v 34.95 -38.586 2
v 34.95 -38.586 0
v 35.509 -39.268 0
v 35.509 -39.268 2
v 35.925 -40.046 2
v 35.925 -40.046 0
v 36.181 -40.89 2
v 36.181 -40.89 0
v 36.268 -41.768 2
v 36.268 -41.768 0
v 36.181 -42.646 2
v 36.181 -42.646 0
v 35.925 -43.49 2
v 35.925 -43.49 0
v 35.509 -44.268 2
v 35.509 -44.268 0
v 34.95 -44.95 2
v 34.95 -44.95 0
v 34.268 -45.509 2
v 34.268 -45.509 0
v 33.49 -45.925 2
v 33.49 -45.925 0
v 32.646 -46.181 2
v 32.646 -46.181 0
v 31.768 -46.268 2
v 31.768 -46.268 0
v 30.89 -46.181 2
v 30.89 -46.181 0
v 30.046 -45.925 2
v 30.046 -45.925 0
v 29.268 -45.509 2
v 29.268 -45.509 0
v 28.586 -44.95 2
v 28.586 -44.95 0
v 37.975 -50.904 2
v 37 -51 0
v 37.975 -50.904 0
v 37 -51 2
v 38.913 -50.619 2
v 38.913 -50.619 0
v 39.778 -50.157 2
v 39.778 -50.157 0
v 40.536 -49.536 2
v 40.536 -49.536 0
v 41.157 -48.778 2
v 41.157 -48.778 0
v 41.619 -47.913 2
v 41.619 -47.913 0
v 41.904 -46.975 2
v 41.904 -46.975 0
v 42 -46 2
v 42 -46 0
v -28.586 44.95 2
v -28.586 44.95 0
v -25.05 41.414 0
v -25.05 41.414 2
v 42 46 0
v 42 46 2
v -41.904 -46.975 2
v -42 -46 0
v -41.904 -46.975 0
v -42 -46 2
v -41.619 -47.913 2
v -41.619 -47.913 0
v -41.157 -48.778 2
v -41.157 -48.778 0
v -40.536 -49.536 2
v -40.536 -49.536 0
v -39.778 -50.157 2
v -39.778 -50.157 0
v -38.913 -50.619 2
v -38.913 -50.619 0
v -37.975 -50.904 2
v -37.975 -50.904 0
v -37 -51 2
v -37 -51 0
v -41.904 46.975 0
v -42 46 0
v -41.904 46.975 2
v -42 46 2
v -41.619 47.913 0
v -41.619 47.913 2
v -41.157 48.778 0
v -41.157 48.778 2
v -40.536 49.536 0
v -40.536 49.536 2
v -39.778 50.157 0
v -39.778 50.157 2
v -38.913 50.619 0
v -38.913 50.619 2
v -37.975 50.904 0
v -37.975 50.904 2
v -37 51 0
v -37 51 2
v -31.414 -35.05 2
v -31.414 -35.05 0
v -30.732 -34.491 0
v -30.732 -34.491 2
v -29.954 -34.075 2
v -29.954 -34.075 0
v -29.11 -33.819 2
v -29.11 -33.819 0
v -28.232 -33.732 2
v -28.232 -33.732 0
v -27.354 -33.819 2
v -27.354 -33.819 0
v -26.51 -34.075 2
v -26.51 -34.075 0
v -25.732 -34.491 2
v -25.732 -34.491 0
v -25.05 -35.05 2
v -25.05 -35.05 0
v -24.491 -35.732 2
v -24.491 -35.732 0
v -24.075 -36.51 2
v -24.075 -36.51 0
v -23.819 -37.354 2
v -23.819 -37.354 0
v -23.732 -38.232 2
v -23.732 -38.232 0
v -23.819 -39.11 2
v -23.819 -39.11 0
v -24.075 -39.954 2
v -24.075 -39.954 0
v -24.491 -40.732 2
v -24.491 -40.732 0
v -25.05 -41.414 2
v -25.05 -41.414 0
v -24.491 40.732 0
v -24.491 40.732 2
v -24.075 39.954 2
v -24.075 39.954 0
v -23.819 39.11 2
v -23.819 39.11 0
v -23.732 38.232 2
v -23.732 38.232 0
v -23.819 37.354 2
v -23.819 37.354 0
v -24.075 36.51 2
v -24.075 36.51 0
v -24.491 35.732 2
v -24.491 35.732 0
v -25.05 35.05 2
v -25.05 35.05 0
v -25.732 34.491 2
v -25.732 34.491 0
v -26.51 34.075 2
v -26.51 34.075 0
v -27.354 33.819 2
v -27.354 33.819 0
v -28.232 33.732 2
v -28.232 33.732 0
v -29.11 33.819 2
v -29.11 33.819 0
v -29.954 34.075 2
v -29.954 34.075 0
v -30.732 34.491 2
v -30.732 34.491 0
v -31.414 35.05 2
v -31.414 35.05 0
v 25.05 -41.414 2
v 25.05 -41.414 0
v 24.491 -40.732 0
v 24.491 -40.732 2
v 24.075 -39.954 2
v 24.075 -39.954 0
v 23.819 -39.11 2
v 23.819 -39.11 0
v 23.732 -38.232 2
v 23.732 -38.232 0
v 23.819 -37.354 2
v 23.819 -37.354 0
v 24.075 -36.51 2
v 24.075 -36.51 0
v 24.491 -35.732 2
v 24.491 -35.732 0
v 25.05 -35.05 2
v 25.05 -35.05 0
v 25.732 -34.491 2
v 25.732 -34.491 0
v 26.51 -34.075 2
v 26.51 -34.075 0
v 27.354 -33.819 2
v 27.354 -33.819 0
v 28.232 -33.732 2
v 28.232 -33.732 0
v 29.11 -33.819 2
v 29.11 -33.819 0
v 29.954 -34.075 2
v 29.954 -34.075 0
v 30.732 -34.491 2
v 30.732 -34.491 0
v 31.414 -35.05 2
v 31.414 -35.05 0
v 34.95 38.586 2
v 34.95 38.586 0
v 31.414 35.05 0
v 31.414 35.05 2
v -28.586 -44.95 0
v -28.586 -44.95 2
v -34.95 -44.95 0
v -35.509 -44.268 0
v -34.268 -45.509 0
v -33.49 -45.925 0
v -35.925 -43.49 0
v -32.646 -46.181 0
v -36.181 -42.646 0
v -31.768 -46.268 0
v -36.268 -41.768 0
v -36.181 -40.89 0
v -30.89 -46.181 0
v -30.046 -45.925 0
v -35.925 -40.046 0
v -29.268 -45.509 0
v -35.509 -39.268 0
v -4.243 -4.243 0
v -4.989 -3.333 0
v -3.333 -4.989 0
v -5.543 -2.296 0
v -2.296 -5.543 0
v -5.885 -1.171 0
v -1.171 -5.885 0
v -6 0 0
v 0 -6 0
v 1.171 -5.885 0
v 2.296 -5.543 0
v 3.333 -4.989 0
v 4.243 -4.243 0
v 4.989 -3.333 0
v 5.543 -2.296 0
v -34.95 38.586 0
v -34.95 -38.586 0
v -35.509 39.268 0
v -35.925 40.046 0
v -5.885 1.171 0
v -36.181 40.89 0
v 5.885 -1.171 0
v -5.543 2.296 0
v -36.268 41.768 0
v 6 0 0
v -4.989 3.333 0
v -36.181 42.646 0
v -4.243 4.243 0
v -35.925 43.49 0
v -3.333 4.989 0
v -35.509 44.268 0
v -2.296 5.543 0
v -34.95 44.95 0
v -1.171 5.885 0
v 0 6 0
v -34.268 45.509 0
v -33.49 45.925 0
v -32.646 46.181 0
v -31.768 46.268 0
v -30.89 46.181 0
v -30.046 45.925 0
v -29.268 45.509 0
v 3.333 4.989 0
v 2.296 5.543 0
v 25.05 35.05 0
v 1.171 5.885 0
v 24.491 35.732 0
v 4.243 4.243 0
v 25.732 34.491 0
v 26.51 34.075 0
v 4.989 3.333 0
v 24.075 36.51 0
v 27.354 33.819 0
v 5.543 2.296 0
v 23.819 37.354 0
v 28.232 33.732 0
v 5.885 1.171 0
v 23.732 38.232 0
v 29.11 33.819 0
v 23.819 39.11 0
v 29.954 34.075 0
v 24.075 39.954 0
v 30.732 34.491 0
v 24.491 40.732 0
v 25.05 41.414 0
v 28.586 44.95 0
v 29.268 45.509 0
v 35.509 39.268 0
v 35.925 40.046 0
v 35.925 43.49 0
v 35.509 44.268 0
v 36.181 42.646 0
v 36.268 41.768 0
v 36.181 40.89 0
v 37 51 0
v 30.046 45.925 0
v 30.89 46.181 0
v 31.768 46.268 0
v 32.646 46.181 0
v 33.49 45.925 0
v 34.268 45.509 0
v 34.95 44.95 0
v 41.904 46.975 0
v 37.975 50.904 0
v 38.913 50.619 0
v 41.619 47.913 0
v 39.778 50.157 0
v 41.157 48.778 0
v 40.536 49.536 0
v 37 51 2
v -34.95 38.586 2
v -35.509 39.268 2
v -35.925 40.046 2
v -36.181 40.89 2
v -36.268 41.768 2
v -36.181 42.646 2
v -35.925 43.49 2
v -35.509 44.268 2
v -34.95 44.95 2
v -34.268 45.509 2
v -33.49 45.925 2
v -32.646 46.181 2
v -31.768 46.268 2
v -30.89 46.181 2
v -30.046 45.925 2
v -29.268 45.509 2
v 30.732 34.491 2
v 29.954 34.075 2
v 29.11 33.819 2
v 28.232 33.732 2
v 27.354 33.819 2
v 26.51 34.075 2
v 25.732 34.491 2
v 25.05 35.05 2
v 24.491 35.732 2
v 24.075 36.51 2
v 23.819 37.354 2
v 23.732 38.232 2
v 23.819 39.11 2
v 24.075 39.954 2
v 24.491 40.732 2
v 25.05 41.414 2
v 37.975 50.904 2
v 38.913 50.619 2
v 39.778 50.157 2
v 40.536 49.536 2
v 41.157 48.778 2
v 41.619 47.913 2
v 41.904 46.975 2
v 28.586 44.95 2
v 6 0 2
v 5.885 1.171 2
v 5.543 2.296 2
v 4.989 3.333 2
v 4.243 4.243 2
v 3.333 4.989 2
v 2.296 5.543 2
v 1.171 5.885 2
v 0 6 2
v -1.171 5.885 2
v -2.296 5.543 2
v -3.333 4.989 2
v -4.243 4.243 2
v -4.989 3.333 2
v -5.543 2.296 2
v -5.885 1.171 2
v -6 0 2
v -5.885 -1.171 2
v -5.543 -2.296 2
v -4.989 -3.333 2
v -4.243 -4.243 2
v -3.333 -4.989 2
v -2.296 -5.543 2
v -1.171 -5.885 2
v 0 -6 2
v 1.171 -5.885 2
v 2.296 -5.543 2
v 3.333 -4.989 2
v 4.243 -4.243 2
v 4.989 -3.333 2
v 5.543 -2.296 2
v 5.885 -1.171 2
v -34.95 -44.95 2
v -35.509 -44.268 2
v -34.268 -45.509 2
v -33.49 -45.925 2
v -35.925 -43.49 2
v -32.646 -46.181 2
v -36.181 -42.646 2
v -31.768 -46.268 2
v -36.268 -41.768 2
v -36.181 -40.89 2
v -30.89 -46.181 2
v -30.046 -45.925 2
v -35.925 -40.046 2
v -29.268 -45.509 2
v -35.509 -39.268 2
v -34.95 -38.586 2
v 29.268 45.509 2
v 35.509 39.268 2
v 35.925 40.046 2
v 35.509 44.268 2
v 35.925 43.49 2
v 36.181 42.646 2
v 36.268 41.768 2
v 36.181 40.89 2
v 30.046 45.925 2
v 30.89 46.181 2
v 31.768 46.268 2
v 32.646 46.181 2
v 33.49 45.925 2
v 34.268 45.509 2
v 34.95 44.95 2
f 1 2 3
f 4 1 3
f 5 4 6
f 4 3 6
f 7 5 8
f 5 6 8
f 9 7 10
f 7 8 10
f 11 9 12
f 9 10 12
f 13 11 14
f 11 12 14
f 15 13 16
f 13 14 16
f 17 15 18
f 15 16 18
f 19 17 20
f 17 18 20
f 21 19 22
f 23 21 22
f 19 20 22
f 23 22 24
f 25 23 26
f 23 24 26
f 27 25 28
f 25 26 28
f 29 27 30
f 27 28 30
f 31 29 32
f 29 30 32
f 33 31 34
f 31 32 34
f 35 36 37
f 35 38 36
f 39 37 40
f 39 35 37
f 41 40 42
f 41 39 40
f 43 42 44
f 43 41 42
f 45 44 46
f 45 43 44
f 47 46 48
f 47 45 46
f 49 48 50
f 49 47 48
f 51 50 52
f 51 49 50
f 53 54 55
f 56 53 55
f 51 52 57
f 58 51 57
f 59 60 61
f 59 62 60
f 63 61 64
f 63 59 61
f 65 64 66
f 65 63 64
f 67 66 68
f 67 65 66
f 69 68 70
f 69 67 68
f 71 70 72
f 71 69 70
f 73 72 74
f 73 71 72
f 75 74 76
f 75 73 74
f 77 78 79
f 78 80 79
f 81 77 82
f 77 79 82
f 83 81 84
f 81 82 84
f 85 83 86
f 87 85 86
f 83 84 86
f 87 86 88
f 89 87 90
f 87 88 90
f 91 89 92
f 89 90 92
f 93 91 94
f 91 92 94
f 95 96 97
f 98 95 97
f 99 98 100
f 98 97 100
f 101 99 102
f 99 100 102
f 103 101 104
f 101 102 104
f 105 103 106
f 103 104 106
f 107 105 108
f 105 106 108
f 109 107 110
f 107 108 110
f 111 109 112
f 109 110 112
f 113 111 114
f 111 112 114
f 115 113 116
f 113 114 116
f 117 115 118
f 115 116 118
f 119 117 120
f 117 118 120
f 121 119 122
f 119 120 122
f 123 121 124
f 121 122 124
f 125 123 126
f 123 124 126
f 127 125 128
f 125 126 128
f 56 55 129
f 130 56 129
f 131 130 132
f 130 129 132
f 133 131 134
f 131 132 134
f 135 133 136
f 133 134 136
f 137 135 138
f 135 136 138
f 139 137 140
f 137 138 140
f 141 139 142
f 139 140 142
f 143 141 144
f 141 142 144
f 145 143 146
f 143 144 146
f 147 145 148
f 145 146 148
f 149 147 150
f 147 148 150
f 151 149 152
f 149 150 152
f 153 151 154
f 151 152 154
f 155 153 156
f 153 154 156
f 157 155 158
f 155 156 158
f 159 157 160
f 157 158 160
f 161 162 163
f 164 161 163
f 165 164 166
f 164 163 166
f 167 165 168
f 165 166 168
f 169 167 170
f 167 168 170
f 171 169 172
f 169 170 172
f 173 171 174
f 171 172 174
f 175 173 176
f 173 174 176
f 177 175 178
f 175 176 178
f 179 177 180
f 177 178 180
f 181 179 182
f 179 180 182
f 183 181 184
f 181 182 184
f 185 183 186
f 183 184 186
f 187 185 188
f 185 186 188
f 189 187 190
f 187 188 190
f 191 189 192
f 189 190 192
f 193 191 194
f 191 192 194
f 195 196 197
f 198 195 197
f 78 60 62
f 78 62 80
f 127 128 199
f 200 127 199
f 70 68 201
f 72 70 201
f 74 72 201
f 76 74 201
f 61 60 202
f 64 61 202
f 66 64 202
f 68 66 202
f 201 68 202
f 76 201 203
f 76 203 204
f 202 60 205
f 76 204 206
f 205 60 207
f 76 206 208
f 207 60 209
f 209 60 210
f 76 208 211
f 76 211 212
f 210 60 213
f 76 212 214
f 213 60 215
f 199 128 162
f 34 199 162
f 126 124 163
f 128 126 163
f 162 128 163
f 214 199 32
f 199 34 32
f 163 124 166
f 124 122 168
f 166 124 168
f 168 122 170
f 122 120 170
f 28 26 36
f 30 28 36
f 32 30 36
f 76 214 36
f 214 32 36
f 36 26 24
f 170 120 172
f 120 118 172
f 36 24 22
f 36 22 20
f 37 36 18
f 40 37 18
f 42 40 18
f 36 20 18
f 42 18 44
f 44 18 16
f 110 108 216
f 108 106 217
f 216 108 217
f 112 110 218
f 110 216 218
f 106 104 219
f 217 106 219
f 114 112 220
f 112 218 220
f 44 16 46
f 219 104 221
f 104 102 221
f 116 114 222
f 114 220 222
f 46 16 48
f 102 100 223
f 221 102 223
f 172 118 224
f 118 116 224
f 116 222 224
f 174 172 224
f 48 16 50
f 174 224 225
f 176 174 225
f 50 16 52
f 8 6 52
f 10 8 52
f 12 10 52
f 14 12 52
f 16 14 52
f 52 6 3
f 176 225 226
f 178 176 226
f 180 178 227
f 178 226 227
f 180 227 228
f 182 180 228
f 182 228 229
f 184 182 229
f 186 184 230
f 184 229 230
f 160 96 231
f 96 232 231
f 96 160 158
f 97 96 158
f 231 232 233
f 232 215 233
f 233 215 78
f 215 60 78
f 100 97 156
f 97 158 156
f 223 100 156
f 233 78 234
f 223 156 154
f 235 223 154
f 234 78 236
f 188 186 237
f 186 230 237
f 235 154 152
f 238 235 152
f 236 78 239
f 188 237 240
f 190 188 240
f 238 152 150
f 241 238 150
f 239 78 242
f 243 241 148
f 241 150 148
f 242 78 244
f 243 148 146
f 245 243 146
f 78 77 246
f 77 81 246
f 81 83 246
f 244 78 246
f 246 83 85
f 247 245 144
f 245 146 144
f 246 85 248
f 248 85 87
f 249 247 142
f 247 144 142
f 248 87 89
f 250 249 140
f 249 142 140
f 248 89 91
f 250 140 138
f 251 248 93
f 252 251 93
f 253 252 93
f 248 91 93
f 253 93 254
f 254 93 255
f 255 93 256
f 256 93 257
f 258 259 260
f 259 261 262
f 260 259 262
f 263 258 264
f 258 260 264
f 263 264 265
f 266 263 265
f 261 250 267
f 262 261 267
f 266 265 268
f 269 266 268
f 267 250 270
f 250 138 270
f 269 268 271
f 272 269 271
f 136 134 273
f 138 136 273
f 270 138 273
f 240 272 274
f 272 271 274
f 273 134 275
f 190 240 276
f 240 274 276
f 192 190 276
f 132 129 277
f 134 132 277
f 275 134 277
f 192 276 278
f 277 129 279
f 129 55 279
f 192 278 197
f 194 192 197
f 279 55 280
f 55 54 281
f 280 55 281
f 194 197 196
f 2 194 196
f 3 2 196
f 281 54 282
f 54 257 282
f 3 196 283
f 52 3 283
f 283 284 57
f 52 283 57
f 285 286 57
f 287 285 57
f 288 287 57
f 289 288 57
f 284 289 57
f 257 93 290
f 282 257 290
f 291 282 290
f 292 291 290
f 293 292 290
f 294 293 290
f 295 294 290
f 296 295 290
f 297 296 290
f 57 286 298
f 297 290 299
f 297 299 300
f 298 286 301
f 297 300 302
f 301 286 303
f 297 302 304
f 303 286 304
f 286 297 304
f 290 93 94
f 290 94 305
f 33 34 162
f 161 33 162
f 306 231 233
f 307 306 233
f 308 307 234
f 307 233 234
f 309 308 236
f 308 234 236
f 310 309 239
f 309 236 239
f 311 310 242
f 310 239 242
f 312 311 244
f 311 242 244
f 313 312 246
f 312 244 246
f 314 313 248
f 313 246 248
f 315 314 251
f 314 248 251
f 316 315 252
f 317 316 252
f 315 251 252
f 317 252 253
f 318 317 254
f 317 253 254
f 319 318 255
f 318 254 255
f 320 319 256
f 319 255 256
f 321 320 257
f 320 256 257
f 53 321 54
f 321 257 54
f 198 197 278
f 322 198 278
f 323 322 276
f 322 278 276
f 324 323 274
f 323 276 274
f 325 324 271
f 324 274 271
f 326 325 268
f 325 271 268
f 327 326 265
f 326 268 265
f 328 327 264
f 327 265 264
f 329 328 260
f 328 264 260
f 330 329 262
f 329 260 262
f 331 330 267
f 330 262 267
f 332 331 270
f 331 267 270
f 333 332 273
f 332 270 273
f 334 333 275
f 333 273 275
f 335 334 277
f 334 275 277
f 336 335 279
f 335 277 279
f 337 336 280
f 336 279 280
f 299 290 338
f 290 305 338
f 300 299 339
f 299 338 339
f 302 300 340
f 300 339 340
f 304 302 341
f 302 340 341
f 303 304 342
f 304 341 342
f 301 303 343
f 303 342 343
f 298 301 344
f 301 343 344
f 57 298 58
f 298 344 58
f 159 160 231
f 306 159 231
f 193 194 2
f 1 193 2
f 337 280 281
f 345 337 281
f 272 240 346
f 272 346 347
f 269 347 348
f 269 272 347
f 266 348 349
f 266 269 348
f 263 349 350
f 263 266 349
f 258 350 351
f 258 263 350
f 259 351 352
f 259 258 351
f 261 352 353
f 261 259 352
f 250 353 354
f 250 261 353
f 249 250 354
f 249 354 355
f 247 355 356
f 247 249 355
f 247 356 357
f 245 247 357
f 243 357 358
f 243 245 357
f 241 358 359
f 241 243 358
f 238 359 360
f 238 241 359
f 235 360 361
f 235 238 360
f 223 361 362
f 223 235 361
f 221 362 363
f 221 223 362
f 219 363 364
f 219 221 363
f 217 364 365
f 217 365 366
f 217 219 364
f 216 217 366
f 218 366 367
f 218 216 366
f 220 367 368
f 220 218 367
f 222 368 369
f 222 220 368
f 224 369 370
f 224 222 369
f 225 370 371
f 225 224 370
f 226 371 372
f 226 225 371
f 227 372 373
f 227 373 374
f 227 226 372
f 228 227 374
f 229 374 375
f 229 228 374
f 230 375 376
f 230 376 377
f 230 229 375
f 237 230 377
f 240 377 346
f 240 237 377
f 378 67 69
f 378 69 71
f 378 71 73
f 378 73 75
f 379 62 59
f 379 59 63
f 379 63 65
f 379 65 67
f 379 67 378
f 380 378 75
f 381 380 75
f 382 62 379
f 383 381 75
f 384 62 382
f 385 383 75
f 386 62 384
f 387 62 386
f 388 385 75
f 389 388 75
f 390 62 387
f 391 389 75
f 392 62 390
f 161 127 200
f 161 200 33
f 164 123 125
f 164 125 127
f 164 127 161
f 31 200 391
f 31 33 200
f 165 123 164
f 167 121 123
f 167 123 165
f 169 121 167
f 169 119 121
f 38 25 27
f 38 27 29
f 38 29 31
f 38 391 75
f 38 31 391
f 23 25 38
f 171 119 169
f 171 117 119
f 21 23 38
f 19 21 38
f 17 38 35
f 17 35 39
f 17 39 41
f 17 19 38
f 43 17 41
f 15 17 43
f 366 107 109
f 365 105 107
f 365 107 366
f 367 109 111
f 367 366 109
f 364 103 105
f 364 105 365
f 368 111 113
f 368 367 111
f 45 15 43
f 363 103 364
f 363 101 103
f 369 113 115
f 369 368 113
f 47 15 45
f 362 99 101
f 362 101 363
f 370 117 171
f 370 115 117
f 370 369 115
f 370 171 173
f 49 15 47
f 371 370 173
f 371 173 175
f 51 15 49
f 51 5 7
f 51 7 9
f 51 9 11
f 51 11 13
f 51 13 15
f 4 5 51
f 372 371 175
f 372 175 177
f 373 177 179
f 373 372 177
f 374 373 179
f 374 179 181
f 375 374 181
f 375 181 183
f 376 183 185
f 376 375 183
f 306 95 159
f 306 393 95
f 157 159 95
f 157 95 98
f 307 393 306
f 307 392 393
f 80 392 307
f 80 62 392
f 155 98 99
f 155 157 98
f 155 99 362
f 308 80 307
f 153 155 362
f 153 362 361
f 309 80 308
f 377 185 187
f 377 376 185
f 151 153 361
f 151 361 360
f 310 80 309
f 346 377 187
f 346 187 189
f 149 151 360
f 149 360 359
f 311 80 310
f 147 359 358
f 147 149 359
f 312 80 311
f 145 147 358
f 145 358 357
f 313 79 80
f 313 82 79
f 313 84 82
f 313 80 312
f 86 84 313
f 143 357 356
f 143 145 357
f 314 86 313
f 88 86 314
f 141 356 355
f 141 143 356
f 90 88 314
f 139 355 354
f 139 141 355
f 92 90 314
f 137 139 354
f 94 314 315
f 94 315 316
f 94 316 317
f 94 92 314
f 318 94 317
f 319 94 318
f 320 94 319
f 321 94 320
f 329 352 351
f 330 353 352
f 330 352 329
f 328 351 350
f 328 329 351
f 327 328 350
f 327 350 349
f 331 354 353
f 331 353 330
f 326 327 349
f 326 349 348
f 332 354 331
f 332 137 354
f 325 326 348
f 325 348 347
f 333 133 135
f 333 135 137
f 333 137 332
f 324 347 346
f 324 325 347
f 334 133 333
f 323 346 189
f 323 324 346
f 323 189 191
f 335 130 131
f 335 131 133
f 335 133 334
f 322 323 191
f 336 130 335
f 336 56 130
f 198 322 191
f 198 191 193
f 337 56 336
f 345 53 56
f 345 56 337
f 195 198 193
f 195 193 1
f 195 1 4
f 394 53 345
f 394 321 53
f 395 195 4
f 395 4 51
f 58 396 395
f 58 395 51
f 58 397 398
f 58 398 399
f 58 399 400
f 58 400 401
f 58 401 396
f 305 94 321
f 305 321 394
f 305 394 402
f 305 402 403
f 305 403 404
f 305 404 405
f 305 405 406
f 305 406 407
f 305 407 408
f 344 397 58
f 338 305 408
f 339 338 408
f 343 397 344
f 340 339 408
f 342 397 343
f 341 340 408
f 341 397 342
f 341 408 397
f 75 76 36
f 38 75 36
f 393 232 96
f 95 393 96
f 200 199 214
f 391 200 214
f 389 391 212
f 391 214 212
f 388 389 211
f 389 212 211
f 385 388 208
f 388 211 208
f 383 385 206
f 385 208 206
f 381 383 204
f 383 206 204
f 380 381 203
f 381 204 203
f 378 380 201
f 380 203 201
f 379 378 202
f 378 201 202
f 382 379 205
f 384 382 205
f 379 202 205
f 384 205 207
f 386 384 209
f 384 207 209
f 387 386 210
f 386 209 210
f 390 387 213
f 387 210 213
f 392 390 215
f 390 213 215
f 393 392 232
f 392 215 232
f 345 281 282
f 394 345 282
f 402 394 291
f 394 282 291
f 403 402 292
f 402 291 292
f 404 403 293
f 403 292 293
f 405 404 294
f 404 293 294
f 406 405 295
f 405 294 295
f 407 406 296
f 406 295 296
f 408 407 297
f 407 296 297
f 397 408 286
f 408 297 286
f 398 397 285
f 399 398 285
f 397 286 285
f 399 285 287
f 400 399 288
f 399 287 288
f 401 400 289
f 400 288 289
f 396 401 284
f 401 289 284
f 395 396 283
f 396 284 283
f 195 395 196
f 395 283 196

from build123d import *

# Parameters (mm, degrees)
F0_W     = 84
F0_H     = 102
F0_R     = 6
F1_DEPTH = 2
F2_R     = 5


with BuildPart() as f1:
    # F0 (on Top) → F1 (new body)
    with BuildSketch(Plane.XY):
        Rectangle(F0_W, F0_H)
        with BuildLine():
            Line((-25.050253, -41.414214), (-28.585786, -44.949747))
            ThreePointArc((-28.585786, -44.949747), (-34.949747, -44.949747), (-34.949747, -38.585786))
            Line((-34.949747, -38.585786), (-31.414214, -35.050253))
            ThreePointArc((-31.414214, -35.050253), (-25.050253, -35.050253), (-25.050253, -41.414214))
        make_face(mode=Mode.SUBTRACT)
        with BuildLine():
            ThreePointArc((25.050253, -41.414214), (25.050253, -35.050253), (31.414214, -35.050253))
            Line((31.414214, -35.050253), (34.949747, -38.585786))
            ThreePointArc((34.949747, -38.585786), (34.949747, -44.949747), (28.585786, -44.949747))
            Line((28.585786, -44.949747), (25.050253, -41.414214))
        make_face(mode=Mode.SUBTRACT)
        with BuildLine():
            ThreePointArc((-34.949747, 38.585786), (-34.949747, 44.949747), (-28.585786, 44.949747))
            Line((-28.585786, 44.949747), (-25.050253, 41.414214))
            ThreePointArc((-25.050253, 41.414214), (-25.050253, 35.050253), (-31.414214, 35.050253))
            Line((-31.414214, 35.050253), (-34.949747, 38.585786))
        make_face(mode=Mode.SUBTRACT)
        Circle(F0_R, mode=Mode.SUBTRACT)
        with BuildLine():
            Line((25.050253, 41.414214), (28.585786, 44.949747))
            ThreePointArc((28.585786, 44.949747), (34.949747, 44.949747), (34.949747, 38.585786))
            Line((34.949747, 38.585786), (31.414214, 35.050253))
            ThreePointArc((31.414214, 35.050253), (25.050253, 35.050253), (25.050253, 41.414214))
        make_face(mode=Mode.SUBTRACT)
    extrude(amount=F1_DEPTH)

    # F2
    f2_edges = [f1.edges().sort_by_distance(p)[0] for p in [
        (42, -51, 1),
        (42, 51, 1),
        (-42, -51, 1),
        (-42, 51, 1),
    ]]
    fillet(f2_edges, radius=F2_R)


solid = f1.part
